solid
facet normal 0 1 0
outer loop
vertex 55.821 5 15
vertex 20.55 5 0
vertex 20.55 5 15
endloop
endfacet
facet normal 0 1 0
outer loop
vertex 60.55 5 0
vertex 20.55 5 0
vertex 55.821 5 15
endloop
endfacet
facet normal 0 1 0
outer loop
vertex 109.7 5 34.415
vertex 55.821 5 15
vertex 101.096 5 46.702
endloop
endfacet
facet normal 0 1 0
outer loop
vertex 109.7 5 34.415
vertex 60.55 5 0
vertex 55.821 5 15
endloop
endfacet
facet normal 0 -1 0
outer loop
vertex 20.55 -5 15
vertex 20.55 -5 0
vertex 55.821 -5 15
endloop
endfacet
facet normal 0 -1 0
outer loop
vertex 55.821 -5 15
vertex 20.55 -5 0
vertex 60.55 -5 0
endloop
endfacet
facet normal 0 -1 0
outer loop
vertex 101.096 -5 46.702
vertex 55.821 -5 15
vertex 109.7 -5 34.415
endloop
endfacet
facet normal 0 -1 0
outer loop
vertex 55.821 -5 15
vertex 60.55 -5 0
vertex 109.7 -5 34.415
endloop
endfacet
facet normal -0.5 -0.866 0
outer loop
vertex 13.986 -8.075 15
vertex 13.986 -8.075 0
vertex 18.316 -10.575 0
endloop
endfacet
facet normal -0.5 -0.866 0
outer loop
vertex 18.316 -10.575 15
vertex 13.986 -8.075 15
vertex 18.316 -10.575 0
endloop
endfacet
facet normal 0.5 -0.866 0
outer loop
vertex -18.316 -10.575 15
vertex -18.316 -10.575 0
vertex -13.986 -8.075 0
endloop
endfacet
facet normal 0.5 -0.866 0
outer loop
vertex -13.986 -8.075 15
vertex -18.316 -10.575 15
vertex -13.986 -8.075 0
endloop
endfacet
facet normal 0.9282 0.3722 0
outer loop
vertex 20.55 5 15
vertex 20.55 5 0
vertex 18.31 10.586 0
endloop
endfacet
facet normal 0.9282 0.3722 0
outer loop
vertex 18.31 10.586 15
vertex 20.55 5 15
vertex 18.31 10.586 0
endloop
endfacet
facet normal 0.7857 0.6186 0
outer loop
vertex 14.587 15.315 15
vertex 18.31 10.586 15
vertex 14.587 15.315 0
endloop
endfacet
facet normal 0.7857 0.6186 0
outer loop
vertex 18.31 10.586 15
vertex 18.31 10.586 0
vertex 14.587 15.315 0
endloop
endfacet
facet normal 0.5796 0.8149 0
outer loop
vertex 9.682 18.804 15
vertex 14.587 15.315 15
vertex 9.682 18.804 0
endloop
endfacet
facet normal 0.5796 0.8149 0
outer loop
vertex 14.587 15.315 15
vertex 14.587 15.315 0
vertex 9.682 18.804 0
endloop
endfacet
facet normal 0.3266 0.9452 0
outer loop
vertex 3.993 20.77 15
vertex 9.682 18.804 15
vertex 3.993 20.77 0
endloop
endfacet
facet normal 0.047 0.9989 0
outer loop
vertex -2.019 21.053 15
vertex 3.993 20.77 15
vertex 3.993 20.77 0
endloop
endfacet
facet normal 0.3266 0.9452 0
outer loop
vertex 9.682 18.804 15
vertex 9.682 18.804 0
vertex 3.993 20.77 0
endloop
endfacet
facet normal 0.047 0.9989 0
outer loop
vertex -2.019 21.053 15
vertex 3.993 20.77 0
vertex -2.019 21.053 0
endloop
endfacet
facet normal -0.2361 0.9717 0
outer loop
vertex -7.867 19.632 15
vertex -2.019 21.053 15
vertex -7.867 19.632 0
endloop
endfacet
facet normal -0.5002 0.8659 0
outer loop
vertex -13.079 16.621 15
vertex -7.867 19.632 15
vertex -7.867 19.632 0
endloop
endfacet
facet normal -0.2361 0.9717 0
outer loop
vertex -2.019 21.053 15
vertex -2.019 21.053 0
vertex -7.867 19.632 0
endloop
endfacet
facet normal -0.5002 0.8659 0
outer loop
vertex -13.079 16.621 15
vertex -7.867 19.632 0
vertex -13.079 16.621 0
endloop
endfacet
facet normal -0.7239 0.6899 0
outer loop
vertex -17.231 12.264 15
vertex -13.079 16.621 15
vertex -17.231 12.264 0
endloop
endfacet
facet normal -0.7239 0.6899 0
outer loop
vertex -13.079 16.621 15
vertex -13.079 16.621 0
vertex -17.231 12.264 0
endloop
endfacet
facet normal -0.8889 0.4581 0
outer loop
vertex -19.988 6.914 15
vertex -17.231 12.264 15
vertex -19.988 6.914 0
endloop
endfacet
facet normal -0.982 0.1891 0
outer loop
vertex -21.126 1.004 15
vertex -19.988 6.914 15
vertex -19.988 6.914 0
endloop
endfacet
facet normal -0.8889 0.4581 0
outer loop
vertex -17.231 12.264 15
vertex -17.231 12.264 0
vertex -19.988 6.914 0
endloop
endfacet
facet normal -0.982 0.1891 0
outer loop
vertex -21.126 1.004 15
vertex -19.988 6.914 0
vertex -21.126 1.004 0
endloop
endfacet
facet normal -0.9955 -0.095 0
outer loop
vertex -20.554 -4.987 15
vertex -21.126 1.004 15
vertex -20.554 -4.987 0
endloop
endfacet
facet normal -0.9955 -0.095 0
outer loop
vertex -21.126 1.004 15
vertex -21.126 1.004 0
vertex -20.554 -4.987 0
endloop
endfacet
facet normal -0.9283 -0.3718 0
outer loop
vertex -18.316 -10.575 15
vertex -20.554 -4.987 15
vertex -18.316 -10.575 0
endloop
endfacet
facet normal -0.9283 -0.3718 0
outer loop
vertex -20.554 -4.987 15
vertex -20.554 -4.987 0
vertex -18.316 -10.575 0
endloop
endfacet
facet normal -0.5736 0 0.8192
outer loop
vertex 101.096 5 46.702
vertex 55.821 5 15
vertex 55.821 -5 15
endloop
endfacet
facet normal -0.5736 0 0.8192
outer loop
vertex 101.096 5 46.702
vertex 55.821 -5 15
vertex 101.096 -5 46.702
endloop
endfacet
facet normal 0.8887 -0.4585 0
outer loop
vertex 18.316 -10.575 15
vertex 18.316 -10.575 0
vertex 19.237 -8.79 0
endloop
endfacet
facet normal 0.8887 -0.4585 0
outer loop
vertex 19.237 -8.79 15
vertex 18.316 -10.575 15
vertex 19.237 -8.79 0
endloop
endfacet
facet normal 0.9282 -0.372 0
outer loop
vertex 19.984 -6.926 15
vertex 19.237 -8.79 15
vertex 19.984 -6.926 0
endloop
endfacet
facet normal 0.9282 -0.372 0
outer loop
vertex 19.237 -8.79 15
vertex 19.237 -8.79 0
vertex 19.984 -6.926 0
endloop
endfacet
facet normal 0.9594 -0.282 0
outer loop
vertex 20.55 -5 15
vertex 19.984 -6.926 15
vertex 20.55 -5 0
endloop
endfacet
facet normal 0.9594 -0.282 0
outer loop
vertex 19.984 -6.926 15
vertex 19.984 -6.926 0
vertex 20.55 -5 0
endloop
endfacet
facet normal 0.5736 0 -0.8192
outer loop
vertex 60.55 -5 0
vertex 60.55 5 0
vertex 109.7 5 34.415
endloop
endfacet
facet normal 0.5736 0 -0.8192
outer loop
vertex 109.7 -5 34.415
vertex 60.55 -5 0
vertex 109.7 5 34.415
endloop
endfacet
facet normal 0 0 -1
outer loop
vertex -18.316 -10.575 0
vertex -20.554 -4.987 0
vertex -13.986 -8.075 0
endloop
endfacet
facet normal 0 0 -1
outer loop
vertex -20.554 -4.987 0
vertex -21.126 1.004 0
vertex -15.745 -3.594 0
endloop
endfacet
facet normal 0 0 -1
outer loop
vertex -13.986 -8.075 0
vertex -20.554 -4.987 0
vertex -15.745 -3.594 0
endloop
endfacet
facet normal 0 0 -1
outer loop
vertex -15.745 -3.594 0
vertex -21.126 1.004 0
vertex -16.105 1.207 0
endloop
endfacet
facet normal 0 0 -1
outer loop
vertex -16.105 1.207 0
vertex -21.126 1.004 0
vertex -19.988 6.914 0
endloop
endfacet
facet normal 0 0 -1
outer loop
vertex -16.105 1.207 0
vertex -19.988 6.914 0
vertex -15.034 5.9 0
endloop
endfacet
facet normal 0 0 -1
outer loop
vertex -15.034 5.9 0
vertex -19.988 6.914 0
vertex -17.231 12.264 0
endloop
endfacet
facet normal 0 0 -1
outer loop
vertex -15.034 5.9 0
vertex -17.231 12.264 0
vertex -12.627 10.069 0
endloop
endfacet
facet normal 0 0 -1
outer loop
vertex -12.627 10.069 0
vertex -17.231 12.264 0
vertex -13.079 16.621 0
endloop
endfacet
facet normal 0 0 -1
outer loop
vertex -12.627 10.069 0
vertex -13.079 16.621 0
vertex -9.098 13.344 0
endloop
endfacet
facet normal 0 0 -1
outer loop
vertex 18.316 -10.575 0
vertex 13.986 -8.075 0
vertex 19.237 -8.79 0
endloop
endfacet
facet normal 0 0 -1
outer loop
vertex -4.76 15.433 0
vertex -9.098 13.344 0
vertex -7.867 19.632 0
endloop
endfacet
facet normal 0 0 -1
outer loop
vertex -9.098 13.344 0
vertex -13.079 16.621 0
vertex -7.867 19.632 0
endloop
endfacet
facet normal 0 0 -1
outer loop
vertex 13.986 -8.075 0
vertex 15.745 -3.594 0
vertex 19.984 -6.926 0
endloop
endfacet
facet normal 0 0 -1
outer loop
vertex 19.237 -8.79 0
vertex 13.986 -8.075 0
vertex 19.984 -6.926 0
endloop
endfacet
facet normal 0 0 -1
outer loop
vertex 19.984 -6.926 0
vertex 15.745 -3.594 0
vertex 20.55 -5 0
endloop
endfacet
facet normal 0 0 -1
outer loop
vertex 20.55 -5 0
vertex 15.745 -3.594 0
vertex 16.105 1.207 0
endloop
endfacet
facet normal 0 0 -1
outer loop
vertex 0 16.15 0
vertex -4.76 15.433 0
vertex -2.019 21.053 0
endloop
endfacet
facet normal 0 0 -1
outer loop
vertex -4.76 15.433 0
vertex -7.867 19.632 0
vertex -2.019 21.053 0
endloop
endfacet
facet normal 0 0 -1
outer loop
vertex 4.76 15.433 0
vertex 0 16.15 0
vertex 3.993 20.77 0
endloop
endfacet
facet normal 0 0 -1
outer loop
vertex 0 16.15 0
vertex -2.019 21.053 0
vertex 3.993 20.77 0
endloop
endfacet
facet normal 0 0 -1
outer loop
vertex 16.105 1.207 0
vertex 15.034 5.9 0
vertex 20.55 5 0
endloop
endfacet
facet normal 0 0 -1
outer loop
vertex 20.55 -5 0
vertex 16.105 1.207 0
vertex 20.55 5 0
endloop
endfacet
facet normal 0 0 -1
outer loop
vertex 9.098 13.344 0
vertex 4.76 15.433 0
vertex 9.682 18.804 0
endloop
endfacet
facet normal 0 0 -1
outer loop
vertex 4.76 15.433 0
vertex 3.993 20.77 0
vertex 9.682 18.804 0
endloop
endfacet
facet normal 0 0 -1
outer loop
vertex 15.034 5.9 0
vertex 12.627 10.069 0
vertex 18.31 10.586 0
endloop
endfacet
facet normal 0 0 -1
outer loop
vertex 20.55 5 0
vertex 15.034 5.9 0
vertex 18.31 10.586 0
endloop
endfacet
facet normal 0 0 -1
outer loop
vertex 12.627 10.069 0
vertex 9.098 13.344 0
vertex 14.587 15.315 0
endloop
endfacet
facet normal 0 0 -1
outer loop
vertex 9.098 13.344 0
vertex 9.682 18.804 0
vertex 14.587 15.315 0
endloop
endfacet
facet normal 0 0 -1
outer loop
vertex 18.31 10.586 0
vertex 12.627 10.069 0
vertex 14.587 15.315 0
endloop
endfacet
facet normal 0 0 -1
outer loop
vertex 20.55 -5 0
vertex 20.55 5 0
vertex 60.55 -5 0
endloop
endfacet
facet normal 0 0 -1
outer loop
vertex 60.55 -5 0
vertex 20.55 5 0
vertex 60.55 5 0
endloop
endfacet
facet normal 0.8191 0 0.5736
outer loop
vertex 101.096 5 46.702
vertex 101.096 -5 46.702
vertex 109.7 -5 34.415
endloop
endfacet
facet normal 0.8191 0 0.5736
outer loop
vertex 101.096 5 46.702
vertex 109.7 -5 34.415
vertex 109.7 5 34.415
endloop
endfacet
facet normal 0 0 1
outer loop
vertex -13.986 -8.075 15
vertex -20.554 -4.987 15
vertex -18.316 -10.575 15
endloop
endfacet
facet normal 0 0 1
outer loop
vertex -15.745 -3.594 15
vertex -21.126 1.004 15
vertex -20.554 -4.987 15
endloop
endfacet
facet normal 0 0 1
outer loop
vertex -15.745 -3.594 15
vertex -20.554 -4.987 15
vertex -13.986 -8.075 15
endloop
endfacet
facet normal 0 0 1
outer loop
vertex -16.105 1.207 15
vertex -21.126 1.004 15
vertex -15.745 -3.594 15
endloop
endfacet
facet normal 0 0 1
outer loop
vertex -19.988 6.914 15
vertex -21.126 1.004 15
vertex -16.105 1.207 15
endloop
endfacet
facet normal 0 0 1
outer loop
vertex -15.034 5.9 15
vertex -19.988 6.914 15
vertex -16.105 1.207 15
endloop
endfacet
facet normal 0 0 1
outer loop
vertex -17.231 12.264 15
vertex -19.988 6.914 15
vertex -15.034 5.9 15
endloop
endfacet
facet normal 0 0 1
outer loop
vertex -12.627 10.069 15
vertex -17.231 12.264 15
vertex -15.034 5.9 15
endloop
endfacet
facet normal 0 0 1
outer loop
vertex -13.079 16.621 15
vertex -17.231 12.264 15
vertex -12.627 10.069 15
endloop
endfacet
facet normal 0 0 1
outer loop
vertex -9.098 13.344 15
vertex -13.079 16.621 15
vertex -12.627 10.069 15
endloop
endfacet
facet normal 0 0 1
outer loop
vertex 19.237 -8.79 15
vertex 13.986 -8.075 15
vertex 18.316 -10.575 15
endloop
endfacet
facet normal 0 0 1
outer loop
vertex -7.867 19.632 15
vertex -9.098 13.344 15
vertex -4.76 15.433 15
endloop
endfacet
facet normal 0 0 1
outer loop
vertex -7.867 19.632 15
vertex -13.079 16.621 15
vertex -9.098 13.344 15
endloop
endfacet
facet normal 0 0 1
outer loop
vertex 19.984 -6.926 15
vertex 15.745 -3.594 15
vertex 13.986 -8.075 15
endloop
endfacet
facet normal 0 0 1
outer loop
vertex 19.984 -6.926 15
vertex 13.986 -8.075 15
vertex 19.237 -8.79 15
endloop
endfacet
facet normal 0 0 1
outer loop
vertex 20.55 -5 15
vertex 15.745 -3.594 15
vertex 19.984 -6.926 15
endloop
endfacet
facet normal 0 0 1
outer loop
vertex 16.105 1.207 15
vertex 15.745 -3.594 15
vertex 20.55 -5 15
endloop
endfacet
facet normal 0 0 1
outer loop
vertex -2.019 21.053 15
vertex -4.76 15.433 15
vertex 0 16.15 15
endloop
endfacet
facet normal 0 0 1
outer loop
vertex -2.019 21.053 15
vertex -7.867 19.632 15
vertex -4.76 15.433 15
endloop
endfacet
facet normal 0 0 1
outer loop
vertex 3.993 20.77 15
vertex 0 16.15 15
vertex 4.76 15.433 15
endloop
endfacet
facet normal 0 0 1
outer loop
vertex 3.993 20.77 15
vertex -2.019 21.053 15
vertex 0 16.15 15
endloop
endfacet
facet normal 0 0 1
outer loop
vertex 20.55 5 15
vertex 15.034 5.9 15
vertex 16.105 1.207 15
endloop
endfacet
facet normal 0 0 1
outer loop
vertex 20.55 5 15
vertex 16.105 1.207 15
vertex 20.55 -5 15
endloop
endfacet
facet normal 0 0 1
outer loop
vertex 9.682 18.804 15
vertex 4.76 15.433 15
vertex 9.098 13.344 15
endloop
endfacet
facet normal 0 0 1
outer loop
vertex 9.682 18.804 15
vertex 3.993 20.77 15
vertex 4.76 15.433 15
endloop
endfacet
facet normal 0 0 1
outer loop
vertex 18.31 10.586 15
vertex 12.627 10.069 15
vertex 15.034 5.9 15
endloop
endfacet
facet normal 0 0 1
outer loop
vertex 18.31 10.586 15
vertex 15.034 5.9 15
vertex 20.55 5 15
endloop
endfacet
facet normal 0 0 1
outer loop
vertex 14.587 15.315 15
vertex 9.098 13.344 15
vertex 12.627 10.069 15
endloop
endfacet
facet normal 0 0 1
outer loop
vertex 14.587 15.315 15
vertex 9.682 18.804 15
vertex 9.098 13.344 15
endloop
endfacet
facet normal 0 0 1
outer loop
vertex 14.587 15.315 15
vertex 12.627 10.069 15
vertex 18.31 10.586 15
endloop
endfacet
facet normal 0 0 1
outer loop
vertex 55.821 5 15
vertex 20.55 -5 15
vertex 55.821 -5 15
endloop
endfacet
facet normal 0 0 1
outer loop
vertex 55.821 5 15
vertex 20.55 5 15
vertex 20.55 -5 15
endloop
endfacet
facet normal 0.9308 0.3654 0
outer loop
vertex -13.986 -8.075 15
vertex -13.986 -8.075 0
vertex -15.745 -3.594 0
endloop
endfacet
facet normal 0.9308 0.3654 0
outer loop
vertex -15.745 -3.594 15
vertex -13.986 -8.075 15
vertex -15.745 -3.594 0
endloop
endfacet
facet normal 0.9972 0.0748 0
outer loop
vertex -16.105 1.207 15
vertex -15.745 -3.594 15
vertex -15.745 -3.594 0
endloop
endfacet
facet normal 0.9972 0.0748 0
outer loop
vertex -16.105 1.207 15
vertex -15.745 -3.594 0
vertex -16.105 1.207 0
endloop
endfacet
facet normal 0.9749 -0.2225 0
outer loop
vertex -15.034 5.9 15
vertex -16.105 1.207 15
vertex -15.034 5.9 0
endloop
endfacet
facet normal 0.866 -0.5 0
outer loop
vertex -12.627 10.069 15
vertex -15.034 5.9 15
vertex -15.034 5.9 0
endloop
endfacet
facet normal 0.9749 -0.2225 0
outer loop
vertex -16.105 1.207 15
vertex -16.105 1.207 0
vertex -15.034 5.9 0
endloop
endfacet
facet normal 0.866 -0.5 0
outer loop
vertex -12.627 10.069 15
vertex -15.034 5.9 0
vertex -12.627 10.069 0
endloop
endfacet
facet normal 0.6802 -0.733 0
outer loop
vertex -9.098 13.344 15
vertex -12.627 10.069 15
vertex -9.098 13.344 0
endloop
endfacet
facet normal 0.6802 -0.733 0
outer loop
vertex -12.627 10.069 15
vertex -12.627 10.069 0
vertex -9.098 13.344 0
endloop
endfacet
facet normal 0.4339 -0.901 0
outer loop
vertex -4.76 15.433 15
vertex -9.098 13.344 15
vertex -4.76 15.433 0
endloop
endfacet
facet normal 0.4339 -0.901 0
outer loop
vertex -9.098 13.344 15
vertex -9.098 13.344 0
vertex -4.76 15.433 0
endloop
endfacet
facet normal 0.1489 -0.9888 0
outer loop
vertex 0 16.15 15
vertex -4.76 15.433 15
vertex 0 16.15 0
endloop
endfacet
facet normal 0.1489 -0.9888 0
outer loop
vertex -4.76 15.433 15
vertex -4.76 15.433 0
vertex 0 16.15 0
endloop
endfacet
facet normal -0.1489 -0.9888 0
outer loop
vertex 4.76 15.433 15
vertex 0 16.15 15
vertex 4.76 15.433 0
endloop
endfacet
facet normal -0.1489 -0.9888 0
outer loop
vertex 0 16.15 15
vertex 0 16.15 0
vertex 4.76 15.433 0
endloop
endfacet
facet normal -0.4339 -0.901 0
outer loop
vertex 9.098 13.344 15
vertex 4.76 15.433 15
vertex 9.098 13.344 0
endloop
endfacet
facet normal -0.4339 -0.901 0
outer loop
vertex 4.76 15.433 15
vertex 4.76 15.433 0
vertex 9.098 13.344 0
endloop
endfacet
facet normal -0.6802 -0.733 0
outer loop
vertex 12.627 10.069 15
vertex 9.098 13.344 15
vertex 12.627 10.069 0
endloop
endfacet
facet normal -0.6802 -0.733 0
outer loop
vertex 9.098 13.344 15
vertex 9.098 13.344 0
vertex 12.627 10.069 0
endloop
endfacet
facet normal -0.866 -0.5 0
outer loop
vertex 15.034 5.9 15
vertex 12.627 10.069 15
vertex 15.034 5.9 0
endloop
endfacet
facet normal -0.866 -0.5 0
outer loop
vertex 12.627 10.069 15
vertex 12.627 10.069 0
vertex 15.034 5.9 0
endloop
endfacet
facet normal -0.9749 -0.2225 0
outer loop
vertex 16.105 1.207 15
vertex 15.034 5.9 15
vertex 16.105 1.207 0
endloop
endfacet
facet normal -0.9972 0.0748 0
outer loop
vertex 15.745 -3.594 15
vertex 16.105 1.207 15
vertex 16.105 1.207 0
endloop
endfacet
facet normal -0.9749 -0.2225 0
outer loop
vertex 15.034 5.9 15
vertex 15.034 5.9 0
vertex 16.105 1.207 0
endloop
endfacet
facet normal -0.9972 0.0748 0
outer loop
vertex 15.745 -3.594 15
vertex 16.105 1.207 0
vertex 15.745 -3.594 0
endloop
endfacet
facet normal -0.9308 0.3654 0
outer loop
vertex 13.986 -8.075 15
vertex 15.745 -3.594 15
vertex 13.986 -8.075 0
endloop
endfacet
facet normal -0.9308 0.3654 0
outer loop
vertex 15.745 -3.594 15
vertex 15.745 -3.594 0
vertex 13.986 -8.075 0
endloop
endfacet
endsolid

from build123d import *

# Parameters (mm, degrees)
F2_DEPTH  = 15
F11_W     = 60
F11_H     = 10
F12_DEPTH = 15


with BuildPart() as f2:
    # F1 (on Top) → F2 (new body)
    with BuildSketch(Plane.XY):
        with BuildLine():
            ThreePointArc((-13.9863102711, -8.075), (0, 16.15), (13.9863102711, -8.075))
            Line((13.9863102711, -8.075), (18.31643729, -10.575))
            ThreePointArc((18.31643729, -10.575), (19.6323610311, -7.8672040995), (20.5504866122, -5))
            ThreePointArc((20.5504866122, -5), (21.15, 0), (20.5504866122, 5))
            ThreePointArc((20.5504866122, 5), (-7.8672040995, 19.6323610311), (-18.31643729, -10.575))
            Line((-18.31643729, -10.575), (-13.9863102711, -8.075))
        make_face()
        with BuildLine():
            ThreePointArc((20.5504866122, 5), (21.15, 0), (20.5504866122, -5))
            Line((20.5504866122, -5), (60.5504866122, -5))
            Line((60.5504866122, -5), (60.5504866122, 5))
            Line((60.5504866122, 5), (20.5504866122, 5))
        make_face()
    extrude(amount=F2_DEPTH)

    # F11 (on 3pt) → F12 (join)
    with BuildSketch(Plane(origin=(19.9205002513, 0, -28.4494227273), x_dir=(0.8191520443, 0, 0.5735764364), z_dir=(-0.5735764364, 0, 0.8191520443))):
        with Locations((79.6000548911, 0)):
            Rectangle(F11_W, F11_H)
    extrude(amount=F12_DEPTH)


solid = f2.part
